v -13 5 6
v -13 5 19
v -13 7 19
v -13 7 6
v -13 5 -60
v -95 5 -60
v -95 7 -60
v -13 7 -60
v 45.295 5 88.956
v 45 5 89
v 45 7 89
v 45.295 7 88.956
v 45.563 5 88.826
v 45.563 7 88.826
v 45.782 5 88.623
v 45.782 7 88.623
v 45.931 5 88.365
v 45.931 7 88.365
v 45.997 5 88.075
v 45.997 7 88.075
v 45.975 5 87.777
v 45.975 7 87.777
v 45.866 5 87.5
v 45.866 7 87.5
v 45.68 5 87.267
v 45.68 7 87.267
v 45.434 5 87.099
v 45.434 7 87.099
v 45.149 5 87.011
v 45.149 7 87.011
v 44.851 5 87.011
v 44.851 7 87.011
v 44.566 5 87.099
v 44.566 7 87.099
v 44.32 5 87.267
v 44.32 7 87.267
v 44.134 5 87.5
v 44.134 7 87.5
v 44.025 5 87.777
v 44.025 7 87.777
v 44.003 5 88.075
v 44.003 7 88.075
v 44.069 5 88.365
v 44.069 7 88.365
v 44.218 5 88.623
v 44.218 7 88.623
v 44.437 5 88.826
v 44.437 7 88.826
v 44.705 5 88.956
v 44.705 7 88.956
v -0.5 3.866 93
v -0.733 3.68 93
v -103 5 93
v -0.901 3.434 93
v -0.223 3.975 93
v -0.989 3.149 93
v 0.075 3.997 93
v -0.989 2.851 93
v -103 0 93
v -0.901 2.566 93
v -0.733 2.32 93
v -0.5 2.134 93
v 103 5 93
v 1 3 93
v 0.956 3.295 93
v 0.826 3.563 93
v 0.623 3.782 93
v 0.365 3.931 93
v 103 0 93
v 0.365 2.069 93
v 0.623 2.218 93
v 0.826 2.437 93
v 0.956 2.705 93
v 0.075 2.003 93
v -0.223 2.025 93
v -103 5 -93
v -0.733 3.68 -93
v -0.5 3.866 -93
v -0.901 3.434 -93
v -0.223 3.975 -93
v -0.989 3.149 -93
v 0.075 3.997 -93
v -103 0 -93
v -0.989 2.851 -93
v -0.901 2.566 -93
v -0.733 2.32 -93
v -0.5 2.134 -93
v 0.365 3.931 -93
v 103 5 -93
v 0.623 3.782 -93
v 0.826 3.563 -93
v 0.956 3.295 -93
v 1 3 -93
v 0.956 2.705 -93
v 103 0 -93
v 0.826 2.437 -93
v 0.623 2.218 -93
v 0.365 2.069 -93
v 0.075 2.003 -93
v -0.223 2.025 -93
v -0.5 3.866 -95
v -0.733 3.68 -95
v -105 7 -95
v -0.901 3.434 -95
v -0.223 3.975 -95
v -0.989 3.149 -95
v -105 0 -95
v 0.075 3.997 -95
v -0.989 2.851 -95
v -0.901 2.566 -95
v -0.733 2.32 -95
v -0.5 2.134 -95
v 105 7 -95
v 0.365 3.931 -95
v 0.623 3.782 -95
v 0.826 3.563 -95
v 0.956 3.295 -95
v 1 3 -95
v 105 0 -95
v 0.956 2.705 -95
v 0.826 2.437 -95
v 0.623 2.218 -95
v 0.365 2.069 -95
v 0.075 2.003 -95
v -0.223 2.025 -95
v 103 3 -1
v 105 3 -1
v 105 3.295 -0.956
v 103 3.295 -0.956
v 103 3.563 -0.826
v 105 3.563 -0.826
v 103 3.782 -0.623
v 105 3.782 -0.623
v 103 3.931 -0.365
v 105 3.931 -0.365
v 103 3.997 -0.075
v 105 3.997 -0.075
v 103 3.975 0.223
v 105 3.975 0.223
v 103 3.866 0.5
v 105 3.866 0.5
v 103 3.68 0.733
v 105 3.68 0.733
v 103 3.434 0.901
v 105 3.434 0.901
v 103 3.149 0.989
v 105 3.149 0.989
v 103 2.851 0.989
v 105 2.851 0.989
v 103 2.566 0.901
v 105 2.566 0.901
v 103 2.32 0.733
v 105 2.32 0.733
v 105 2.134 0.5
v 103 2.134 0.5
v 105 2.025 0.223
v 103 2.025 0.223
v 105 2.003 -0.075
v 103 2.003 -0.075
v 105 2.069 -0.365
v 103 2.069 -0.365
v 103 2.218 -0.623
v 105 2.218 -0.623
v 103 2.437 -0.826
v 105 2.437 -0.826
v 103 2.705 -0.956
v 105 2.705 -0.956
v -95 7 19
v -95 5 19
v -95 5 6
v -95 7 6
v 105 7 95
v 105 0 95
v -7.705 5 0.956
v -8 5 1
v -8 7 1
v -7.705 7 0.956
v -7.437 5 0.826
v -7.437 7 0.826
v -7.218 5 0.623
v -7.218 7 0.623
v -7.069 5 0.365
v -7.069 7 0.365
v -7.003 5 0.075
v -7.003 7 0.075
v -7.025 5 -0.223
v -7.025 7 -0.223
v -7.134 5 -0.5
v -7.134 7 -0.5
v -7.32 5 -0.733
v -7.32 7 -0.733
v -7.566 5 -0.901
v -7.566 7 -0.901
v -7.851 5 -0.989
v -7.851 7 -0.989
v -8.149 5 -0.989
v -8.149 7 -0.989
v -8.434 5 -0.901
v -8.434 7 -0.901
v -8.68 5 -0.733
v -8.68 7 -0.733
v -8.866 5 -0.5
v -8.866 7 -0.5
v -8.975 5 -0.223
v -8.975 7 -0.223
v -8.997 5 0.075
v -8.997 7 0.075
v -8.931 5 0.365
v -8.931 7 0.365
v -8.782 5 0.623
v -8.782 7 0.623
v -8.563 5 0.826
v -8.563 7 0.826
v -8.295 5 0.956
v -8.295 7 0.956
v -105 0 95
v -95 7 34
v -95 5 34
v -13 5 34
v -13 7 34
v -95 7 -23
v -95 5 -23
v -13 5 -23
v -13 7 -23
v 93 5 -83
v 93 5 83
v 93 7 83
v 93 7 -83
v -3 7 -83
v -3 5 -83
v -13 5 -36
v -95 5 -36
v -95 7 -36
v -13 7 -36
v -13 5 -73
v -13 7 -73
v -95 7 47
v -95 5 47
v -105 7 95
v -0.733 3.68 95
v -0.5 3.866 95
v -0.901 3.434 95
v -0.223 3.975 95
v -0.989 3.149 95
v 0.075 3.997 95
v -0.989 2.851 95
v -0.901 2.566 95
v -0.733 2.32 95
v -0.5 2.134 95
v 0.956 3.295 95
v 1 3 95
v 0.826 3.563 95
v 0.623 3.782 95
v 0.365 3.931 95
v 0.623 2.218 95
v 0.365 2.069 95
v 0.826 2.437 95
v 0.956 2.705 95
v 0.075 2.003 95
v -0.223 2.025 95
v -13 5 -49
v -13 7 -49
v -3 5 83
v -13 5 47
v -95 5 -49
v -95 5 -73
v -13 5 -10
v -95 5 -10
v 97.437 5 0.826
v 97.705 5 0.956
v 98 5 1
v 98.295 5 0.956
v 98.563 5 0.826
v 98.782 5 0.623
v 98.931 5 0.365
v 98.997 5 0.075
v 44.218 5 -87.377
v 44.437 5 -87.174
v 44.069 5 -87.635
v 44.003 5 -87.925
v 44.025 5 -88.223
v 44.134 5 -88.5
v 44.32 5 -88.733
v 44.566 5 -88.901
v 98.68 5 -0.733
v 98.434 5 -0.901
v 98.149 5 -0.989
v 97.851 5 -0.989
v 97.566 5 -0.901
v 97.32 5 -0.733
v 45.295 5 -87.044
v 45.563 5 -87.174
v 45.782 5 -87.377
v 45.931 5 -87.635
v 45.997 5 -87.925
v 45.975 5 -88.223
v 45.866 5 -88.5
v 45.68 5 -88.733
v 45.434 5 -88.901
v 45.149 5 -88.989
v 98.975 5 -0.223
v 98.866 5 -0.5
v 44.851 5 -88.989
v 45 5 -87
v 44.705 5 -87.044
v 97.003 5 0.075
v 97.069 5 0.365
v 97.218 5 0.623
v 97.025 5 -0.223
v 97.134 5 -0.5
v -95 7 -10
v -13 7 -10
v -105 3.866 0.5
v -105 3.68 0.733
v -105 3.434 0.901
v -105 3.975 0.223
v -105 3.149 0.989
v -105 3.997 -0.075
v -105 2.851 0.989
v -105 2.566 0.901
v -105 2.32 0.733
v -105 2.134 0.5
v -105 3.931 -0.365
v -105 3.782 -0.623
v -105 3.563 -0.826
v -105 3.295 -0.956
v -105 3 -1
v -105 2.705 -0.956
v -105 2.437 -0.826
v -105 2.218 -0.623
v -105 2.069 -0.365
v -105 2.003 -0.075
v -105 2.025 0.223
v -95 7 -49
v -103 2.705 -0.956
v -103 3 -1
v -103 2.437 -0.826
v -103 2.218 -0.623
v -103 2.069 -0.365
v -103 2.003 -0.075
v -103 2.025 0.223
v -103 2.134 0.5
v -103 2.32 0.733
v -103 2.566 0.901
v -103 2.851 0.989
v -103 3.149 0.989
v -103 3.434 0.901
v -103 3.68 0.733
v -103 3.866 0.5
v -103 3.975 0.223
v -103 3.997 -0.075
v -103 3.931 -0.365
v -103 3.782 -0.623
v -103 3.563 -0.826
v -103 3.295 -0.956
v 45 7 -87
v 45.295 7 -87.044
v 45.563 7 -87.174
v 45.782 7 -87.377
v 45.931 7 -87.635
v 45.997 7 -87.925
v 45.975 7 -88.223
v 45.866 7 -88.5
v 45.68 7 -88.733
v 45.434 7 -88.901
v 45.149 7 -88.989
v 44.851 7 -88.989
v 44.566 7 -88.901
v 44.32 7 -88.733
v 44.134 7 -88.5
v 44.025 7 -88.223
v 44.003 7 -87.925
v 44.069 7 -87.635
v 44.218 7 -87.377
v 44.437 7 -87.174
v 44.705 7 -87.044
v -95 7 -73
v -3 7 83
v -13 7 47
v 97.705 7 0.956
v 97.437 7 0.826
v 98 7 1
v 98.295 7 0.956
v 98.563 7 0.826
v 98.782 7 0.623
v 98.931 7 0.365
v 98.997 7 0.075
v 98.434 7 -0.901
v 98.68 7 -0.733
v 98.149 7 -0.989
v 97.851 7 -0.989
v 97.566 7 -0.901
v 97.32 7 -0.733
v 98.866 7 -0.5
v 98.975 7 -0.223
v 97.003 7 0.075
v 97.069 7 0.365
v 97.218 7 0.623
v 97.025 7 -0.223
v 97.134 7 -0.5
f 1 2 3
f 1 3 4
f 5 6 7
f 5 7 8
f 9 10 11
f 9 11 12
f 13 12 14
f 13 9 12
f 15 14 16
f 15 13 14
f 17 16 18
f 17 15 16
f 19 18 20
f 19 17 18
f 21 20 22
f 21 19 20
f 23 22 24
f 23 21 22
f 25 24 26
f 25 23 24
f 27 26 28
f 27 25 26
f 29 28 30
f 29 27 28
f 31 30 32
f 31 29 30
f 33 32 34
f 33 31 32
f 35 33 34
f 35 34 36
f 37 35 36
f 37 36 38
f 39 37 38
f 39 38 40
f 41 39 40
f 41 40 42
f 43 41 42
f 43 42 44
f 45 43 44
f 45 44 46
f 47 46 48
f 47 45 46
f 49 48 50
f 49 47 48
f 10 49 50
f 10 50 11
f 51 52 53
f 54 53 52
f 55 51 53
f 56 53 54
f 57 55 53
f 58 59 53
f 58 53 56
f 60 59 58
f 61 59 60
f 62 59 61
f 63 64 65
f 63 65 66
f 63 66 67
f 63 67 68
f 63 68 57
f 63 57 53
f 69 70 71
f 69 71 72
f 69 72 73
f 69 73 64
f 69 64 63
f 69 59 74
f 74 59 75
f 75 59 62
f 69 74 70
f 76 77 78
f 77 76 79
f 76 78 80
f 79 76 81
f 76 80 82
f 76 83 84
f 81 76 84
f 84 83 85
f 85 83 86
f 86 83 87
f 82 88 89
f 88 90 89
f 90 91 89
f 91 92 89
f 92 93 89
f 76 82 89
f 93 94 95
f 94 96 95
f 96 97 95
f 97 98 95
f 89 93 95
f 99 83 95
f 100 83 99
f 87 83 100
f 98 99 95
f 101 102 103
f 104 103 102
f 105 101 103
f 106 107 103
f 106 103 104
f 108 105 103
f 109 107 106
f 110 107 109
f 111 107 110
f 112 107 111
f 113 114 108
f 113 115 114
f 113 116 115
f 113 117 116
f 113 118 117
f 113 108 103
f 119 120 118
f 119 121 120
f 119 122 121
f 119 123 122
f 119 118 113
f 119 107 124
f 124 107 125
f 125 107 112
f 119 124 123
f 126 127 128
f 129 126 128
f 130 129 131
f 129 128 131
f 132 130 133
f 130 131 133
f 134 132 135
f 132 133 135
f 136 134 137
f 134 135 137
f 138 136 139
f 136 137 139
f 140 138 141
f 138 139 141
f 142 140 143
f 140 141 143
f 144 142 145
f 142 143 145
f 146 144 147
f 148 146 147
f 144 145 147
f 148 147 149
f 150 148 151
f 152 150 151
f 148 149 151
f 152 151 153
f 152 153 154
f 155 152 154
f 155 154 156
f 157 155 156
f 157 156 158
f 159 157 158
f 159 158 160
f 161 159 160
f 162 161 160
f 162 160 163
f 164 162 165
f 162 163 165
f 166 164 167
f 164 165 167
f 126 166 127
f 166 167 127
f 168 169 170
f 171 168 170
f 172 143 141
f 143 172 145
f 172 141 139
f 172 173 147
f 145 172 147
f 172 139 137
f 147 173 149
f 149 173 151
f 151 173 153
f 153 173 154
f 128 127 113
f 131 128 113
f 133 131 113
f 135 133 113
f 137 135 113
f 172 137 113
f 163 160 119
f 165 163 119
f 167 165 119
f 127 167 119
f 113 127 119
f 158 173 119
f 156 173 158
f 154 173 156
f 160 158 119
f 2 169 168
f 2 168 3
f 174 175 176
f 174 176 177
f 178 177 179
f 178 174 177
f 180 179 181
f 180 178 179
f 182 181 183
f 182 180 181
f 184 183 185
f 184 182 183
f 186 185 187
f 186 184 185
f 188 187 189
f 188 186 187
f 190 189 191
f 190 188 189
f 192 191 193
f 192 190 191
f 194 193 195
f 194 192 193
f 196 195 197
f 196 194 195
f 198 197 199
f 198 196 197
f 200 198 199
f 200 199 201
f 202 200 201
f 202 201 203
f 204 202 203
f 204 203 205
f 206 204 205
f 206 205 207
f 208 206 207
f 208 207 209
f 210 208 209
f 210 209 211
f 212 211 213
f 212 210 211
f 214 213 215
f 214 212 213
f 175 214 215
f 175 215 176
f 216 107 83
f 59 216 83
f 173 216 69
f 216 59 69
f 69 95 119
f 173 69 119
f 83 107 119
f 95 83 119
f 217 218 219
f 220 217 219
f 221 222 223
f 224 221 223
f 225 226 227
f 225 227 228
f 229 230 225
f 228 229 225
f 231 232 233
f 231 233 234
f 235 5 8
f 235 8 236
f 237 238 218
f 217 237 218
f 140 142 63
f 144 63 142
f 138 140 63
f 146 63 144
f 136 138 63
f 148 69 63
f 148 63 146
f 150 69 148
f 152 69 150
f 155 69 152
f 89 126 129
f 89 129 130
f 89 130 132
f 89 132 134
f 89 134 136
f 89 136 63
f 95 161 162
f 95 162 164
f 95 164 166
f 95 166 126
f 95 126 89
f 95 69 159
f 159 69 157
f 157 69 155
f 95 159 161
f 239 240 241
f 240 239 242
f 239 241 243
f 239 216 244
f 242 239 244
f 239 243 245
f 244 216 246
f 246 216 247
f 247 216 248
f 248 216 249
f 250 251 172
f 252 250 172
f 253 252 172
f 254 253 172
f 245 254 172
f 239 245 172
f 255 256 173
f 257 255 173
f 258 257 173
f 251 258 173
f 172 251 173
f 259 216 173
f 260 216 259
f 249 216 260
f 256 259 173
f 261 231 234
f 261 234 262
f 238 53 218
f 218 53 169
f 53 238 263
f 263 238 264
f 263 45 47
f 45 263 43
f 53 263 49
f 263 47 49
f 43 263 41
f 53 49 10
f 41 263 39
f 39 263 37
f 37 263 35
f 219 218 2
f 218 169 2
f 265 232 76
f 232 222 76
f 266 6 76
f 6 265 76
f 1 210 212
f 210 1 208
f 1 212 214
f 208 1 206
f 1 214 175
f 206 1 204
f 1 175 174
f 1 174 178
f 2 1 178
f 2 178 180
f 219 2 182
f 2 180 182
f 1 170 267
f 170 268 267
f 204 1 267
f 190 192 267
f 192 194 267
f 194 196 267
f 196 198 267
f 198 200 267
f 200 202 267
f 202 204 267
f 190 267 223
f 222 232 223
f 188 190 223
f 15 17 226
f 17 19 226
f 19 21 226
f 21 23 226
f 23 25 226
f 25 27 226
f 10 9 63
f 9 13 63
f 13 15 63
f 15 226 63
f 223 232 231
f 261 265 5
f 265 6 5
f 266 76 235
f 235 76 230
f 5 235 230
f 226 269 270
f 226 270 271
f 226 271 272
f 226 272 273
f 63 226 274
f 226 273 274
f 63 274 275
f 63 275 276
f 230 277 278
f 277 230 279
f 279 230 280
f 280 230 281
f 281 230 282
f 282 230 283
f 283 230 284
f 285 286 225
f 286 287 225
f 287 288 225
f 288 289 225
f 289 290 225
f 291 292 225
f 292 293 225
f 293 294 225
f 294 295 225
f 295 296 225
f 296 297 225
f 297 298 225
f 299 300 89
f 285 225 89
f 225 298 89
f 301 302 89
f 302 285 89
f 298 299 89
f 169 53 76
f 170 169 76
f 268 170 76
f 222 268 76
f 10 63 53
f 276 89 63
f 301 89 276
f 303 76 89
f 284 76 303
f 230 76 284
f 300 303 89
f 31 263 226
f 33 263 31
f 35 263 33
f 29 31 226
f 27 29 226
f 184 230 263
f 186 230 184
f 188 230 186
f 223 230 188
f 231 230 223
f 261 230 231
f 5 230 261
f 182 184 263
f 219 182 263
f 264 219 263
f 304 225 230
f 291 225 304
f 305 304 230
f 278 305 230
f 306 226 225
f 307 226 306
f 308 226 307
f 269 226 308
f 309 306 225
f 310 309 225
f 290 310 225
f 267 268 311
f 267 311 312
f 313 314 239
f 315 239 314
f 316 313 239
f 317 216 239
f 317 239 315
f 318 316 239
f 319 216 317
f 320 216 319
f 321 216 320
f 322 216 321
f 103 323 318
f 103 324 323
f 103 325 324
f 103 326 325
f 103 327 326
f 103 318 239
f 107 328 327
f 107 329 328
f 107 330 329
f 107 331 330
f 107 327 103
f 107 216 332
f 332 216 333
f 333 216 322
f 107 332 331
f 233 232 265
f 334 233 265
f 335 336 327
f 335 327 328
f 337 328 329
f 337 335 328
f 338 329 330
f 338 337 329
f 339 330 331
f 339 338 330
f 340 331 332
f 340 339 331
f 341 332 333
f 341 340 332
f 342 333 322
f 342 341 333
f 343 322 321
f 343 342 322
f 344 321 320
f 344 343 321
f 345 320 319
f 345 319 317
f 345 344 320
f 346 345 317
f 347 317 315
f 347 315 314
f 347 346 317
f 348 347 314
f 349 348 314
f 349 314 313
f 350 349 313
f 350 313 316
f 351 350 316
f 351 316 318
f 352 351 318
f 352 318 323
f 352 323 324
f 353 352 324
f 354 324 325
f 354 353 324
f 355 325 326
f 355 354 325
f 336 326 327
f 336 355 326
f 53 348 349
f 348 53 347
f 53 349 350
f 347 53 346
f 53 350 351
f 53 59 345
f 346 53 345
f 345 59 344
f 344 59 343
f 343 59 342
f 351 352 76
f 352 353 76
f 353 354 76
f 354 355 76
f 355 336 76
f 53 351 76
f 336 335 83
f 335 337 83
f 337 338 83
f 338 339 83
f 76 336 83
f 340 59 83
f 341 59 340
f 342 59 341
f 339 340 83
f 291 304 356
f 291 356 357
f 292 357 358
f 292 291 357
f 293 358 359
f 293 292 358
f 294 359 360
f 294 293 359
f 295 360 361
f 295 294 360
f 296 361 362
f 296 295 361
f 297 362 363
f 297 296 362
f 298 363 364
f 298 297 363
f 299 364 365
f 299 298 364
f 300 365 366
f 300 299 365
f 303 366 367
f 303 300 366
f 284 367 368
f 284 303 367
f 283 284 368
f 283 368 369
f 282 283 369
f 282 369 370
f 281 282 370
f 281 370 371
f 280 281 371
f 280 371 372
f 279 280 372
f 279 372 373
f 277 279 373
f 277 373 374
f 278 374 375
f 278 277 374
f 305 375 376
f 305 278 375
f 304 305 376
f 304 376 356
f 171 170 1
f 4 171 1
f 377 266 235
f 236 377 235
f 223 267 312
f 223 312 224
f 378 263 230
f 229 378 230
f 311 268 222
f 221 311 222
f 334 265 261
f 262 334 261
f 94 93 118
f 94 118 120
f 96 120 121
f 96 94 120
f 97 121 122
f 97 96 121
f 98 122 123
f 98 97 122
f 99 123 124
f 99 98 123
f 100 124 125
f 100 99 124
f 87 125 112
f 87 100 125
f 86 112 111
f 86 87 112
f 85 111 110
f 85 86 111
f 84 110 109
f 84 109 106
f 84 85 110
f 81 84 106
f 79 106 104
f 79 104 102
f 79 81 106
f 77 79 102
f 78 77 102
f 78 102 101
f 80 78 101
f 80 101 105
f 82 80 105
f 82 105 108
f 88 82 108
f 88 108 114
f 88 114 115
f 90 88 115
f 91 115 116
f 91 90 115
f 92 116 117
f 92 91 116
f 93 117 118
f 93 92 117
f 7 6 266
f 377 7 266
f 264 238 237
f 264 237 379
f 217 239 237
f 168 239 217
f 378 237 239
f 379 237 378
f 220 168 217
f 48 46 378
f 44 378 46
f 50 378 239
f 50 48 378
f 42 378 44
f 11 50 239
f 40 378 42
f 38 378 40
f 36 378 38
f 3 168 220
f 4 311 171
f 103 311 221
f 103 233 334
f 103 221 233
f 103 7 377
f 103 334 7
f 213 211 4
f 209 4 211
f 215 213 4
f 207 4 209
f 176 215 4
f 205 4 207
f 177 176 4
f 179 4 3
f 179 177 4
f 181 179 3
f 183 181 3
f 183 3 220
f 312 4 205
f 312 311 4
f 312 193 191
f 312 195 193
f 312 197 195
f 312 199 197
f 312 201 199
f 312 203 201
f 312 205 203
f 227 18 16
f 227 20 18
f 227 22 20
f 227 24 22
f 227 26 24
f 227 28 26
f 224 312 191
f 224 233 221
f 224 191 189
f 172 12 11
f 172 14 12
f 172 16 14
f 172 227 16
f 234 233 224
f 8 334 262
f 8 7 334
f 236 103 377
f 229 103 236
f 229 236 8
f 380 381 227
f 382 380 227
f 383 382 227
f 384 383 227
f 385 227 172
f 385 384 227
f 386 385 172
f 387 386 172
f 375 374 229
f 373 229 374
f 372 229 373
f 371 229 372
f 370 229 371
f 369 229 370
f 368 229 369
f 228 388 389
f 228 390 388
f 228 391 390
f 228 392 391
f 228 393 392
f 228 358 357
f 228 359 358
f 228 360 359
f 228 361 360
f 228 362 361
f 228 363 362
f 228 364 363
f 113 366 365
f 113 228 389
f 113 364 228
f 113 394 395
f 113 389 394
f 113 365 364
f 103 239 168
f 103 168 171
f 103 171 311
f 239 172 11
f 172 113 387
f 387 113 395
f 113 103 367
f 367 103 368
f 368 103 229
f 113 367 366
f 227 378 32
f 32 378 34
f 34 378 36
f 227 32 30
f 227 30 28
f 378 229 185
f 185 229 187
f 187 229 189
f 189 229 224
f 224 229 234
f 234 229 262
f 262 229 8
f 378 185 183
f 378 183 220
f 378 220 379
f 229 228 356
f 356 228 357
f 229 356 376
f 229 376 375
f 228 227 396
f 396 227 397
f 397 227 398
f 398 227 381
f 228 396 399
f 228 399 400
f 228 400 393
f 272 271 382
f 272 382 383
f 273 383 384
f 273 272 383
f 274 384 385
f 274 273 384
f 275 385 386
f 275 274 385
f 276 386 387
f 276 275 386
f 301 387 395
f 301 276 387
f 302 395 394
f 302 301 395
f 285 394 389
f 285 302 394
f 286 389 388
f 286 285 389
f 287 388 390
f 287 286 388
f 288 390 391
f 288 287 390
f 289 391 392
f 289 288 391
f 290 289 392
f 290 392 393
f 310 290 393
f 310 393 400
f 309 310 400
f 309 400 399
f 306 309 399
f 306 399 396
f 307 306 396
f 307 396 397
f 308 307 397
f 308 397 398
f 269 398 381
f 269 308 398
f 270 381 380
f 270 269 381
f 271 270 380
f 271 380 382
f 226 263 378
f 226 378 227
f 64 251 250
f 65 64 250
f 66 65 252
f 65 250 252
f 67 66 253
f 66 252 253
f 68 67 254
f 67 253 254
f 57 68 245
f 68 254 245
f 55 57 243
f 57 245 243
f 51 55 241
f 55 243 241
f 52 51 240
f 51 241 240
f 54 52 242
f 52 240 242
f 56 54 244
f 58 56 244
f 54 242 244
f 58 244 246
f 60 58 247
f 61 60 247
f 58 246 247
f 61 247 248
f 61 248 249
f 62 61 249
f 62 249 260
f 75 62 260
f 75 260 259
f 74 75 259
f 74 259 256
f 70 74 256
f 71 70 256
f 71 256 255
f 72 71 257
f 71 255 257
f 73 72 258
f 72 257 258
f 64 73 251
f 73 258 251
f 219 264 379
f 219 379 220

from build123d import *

# Parameters (mm, degrees)
SKETCH1_W           = 210
SKETCH1_H           = 190
SKETCH1_W_2         = 206
SKETCH1_H_2         = 186
BOSS_EXTRUDE1_DEPTH = 5
SKETCH7_R           = 1
CUT_EXTRUDE1_DEPTH  = 2
SKETCH8_R           = 1
CUT_EXTRUDE2_DEPTH  = 2
CUT_EXTRUDE3_START  = -2
SKETCH6_R           = 1
CUT_EXTRUDE3_DEPTH  = 2
CUT_EXTRUDE4_START  = -2
SKETCH5_R           = 1
CUT_EXTRUDE4_DEPTH  = 2
SKETCH9_W           = 210
SKETCH9_H           = 190
SKETCH9_R           = 1
SKETCH9_W_2         = 96
SKETCH9_H_2         = 166
SKETCH9_W_3         = 82
SKETCH9_H_3         = 13
BOSS_EXTRUDE3_DEPTH = 2


with BuildPart() as part:
    # Sketch1 → Boss-Extrude1 (new body)
    with BuildSketch(Plane(origin=(0, 0, 0), x_dir=(1, 0, 0), z_dir=(0, 1, 0))):
        Rectangle(SKETCH1_W, SKETCH1_H)
        Rectangle(SKETCH1_W_2, SKETCH1_H_2, mode=Mode.SUBTRACT)
    extrude(amount=BOSS_EXTRUDE1_DEPTH)

    # Sketch7 → Cut-Extrude1 (cut)
    with BuildSketch(Plane(origin=(105, 0, 0), x_dir=(0, 0, -1), z_dir=(1, 0, 0))):
        with Locations((0, 3)):
            Circle(SKETCH7_R)
    extrude(amount=-CUT_EXTRUDE1_DEPTH, mode=Mode.SUBTRACT)

    # Sketch8 → Cut-Extrude2 (cut)
    with BuildSketch(Plane.XY.offset(95)):
        with Locations((0, 3)):
            Circle(SKETCH8_R)
    extrude(amount=-CUT_EXTRUDE2_DEPTH, mode=Mode.SUBTRACT)

    # Sketch6 → Cut-Extrude3 (cut)
    with BuildSketch(Plane(origin=(0, 0, -95), x_dir=(-1, 0, 0), z_dir=(0, 0, -1)).offset(CUT_EXTRUDE3_START)):
        with Locations(Location((0, 3, 0), (0, 0, 180))):
            Circle(SKETCH6_R)
    extrude(amount=CUT_EXTRUDE3_DEPTH, mode=Mode.SUBTRACT)

    # Sketch5 → Cut-Extrude4 (cut)
    with BuildSketch(Plane.ZY.offset(105).offset(CUT_EXTRUDE4_START)):
        with Locations(Location((0, 3, 0), (0, 0, 180))):
            Circle(SKETCH5_R)
    extrude(amount=CUT_EXTRUDE4_DEPTH, mode=Mode.SUBTRACT)

    # Sketch9 → Boss-Extrude3 (add)
    with BuildSketch(Plane(origin=(0, 5, 0), x_dir=(1, 0, 0), z_dir=(0, 1, 0))):
        Rectangle(SKETCH9_W, SKETCH9_H)
        with Locations(Location((98, 0, 0), (0, 0, 270))):
            Circle(SKETCH9_R, mode=Mode.SUBTRACT)
        with Locations(Location((45, 88, 0), (0, 0, 270))):
            Circle(SKETCH9_R, mode=Mode.SUBTRACT)
        with Locations(Location((-8, 0, 0), (0, 0, 270))):
            Circle(SKETCH9_R, mode=Mode.SUBTRACT)
        with Locations(Location((45, -88, 0), (0, 0, 270))):
            Circle(SKETCH9_R, mode=Mode.SUBTRACT)
        with Locations((45, 0)):
            Rectangle(SKETCH9_W_2, SKETCH9_H_2, mode=Mode.SUBTRACT)
        with Locations((-54, -40.5)):
            Rectangle(SKETCH9_W_3, SKETCH9_H_3, mode=Mode.SUBTRACT)
        with Locations((-54, -12.5)):
            Rectangle(SKETCH9_W_3, SKETCH9_H_3, mode=Mode.SUBTRACT)
        with Locations((-54, 16.5)):
            Rectangle(SKETCH9_W_3, SKETCH9_H_3, mode=Mode.SUBTRACT)
        with Locations((-54, 42.5)):
            Rectangle(SKETCH9_W_3, SKETCH9_H_3, mode=Mode.SUBTRACT)
        with Locations((-54, 66.5)):
            Rectangle(SKETCH9_W_3, SKETCH9_H_3, mode=Mode.SUBTRACT)
    extrude(amount=BOSS_EXTRUDE3_DEPTH)


solid = part.part
